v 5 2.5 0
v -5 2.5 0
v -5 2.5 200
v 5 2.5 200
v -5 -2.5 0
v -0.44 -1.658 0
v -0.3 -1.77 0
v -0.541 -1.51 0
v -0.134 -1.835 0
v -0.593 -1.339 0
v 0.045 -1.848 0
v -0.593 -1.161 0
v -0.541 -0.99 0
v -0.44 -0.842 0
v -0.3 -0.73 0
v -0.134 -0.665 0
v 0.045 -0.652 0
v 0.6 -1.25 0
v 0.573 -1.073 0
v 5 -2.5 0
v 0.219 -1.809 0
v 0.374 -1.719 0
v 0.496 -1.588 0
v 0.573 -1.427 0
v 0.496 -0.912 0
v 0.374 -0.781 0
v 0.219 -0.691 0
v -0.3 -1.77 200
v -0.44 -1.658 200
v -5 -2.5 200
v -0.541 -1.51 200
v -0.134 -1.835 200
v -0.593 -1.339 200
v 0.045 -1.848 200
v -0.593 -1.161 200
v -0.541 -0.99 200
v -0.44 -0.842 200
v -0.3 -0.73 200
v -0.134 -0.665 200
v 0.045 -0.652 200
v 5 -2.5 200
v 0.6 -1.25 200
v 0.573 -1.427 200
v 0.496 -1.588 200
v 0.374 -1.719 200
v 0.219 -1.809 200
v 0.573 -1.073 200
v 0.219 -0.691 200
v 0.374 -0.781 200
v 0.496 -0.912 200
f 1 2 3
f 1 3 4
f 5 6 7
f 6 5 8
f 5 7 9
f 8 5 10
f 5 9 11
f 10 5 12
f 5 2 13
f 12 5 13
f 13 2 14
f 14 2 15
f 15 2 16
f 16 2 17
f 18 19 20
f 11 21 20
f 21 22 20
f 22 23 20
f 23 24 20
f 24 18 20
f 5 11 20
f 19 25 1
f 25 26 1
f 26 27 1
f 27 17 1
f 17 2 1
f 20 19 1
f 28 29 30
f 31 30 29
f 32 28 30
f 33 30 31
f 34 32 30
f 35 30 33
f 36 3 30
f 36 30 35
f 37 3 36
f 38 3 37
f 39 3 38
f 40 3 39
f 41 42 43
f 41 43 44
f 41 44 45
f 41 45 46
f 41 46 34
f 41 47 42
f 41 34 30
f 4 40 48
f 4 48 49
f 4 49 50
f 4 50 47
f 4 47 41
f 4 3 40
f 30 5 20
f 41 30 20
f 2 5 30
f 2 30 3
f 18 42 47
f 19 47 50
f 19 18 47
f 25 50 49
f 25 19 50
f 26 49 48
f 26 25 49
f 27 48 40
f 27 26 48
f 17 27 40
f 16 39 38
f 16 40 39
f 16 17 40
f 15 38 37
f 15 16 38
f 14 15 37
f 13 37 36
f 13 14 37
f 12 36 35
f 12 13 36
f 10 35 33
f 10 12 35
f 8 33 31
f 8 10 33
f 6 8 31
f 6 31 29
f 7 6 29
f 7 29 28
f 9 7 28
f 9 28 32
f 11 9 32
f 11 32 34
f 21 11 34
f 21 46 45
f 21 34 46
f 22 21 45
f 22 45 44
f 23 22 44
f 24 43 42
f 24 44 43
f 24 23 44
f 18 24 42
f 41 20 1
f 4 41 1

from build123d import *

# Parameters (mm, degrees)
SKIZZE1_W                       = 10
SKIZZE1_H                       = 5
AUFSATZ_LINEAR_AUSTRAGEN1_DEPTH = 200
SKIZZE2_R                       = 0.6
SCHNITT_LINEAR_AUSTRAGEN1_DEPTH = 201


with BuildPart() as part:
    # Skizze1 → Aufsatz-Linear austragen1 (new body)
    with BuildSketch(Plane.XY):
        Rectangle(SKIZZE1_W, SKIZZE1_H)
    extrude(amount=AUFSATZ_LINEAR_AUSTRAGEN1_DEPTH)

    # Skizze2 → Schnitt-Linear austragen1 (cut, through all)
    with BuildSketch(Plane.XY):
        with Locations((0, -1.25)):
            Circle(SKIZZE2_R)
    extrude(amount=SCHNITT_LINEAR_AUSTRAGEN1_DEPTH, mode=Mode.SUBTRACT)


solid = part.part
